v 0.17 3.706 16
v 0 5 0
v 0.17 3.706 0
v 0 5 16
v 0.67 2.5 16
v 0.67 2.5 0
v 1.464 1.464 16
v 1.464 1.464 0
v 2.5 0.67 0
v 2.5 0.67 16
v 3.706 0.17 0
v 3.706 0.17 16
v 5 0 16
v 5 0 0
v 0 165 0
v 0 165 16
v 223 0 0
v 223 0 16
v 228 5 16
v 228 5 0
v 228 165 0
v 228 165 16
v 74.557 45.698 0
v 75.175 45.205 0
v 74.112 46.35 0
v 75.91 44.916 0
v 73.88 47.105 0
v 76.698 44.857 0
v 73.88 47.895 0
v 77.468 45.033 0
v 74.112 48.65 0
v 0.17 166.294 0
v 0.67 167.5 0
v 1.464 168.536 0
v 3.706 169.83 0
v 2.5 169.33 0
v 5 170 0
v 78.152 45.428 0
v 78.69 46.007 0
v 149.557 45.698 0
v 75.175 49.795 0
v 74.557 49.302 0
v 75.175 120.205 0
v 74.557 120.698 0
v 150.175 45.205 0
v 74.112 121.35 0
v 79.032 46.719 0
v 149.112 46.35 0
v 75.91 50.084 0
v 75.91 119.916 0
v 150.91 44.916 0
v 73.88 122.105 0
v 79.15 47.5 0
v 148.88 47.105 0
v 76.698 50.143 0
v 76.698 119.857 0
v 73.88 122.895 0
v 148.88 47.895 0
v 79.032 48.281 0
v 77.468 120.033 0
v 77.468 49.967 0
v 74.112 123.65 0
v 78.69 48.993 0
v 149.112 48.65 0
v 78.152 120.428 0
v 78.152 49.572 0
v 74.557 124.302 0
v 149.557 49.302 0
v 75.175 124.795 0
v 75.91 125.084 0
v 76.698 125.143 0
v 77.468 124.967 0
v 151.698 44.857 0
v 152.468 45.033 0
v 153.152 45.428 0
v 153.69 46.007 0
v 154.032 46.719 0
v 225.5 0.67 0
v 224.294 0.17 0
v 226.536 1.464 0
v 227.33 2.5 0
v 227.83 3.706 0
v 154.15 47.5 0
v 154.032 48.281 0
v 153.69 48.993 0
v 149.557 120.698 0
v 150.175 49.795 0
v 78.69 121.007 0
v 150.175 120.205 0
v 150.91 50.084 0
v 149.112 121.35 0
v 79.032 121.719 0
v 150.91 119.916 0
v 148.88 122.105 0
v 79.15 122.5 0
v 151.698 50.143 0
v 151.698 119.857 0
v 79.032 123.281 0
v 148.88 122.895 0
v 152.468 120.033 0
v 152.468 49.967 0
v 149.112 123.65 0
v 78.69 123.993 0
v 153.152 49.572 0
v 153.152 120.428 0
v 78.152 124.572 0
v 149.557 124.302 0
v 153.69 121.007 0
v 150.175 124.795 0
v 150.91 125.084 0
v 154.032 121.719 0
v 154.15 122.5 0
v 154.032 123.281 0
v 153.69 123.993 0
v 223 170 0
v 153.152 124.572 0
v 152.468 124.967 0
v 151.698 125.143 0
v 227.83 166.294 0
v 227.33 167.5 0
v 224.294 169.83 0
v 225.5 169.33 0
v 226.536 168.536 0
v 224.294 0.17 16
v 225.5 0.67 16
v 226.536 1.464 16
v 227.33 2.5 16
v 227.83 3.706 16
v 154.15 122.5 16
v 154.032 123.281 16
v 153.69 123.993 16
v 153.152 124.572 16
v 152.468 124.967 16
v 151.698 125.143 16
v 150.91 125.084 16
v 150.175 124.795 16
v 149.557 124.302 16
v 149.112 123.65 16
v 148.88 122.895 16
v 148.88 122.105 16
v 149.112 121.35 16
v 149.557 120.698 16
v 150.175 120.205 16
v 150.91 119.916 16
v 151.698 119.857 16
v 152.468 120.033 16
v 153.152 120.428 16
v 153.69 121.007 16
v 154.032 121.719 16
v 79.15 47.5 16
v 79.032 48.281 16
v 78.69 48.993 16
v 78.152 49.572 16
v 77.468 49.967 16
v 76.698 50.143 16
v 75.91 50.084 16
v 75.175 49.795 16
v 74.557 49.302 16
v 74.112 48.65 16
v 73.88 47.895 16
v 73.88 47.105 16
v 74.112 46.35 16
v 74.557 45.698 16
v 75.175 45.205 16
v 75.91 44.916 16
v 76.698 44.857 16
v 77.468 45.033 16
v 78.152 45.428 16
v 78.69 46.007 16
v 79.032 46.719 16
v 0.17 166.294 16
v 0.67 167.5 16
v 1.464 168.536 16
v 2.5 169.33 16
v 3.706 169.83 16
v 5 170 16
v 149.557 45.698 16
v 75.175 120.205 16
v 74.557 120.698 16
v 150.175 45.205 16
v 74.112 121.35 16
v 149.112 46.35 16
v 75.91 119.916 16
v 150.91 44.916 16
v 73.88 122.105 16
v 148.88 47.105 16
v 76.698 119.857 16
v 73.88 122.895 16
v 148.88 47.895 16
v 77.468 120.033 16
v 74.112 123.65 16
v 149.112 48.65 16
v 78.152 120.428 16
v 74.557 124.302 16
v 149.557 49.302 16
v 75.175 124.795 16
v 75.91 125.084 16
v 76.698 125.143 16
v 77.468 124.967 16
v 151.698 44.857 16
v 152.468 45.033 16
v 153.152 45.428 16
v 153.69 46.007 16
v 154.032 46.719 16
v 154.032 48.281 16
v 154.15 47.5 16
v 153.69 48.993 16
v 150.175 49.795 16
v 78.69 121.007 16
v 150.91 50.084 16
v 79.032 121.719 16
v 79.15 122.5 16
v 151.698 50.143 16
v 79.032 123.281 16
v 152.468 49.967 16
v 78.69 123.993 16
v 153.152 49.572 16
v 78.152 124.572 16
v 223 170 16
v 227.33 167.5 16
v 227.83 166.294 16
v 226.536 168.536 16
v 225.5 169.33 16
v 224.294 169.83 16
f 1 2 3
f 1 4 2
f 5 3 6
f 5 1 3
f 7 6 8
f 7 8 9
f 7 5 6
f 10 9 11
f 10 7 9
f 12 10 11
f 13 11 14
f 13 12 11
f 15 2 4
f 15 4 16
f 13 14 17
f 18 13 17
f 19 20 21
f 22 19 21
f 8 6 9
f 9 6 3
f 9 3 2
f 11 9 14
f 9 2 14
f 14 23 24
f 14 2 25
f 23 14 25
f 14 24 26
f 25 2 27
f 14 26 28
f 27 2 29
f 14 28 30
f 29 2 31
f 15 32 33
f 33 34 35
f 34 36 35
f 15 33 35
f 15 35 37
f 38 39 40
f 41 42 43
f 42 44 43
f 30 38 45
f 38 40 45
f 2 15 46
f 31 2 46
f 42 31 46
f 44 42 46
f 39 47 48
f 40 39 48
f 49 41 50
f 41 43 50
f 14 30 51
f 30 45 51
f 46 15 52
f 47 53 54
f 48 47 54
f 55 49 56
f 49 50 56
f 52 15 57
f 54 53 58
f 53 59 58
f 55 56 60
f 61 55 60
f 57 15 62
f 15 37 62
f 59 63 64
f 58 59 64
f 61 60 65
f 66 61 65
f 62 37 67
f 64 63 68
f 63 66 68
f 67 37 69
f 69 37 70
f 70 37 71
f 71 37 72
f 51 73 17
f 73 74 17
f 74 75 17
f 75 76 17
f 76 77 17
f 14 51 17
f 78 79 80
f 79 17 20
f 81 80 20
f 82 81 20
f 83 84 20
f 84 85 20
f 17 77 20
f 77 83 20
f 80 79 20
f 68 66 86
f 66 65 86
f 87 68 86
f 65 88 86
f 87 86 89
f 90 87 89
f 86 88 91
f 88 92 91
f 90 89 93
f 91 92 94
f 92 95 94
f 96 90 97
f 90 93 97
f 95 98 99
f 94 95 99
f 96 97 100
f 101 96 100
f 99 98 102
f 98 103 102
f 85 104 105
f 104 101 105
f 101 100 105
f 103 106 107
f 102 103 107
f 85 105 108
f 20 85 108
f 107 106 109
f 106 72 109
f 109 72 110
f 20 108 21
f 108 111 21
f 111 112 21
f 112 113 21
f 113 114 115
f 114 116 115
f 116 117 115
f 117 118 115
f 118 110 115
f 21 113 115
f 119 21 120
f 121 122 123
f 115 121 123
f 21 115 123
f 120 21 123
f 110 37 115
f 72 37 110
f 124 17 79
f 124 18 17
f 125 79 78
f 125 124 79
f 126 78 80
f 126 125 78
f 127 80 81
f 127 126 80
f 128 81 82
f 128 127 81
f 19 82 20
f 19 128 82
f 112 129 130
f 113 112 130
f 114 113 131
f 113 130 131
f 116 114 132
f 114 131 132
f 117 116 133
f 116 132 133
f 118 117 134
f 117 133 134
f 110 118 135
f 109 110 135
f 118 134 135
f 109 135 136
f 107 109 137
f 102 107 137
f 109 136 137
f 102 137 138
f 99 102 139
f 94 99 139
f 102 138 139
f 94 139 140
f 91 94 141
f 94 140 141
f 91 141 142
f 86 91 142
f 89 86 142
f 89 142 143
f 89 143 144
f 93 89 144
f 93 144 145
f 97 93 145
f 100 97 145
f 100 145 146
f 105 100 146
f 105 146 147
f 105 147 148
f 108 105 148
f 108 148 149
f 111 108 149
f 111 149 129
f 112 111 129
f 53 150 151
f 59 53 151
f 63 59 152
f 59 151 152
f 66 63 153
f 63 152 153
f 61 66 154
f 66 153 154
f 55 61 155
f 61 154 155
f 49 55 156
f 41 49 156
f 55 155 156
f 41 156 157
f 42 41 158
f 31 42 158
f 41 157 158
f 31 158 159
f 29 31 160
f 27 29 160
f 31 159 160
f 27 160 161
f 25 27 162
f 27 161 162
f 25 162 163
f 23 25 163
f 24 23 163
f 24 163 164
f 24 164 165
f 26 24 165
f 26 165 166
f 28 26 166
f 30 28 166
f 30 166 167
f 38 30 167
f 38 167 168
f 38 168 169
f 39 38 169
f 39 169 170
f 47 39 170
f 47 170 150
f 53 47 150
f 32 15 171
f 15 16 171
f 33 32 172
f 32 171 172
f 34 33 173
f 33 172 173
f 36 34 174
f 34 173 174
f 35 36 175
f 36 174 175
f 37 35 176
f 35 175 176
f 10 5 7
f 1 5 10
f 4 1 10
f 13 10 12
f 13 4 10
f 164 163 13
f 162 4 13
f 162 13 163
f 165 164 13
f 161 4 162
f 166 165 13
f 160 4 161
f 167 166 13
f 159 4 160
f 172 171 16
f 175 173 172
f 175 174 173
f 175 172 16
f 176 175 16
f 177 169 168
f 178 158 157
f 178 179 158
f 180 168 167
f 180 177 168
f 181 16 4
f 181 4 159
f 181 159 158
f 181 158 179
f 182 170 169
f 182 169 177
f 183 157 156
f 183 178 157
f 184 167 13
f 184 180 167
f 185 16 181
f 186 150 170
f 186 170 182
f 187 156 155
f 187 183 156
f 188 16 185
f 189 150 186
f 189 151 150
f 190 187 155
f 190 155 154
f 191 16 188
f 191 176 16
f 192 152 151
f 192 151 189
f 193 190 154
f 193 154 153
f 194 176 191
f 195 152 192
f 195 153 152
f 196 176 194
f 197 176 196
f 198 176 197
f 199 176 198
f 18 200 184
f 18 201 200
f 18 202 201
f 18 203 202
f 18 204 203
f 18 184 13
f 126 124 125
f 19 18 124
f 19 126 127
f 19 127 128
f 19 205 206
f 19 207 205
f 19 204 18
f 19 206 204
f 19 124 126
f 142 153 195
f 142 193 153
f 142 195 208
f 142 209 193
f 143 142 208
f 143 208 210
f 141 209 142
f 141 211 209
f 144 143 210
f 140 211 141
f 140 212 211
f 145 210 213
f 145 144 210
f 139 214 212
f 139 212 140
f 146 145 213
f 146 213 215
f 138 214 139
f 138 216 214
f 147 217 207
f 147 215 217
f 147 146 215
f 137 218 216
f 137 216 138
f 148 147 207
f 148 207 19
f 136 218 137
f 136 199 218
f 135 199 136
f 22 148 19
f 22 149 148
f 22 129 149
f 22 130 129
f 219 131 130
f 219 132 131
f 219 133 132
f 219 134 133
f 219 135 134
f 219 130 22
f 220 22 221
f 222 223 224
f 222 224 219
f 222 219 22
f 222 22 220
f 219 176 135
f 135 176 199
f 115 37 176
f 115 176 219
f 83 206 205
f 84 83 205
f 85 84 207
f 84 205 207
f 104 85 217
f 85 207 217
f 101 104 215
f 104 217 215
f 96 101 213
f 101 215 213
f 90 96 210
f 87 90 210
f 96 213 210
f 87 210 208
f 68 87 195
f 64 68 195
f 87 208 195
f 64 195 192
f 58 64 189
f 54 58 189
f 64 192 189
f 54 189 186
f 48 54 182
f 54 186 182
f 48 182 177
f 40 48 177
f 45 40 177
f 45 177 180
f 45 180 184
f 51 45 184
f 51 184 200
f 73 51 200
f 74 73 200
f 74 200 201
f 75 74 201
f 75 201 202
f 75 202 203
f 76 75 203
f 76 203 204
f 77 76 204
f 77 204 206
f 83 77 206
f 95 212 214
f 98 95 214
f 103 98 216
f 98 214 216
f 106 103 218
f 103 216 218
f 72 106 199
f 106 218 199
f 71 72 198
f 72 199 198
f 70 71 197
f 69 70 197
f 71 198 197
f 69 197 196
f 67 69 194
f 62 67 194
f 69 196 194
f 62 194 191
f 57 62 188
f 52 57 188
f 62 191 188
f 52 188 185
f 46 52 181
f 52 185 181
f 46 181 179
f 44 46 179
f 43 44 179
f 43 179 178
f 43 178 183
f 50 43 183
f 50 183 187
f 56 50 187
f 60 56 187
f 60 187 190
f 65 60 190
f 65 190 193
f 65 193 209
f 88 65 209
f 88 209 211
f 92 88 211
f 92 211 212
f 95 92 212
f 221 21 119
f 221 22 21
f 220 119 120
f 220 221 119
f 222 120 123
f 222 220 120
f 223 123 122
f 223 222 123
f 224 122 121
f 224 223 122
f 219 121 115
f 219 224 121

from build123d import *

# Parameters (mm, degrees)
SKETCH1_W           = 228
SKETCH1_H           = 170
BOSS_EXTRUDE1_DEPTH = 16
FILLET1_R           = 5
CUT_EXTRUDE1_REACH  = 18
SKETCH2_R           = 2.65


with BuildPart() as part:
    # Sketch1 → Boss-Extrude1 (new body)
    with BuildSketch(Plane.XY):
        with Locations((114, 85)):
            Rectangle(SKETCH1_W, SKETCH1_H)
    extrude(amount=BOSS_EXTRUDE1_DEPTH)

    # Fillet1
    fillet1_edges = [part.edges().sort_by_distance(p)[0] for p in [
        (0, 170, 8),
        (228, 170, 8),
        (228, 0, 8),
        (0, 0, 8),
    ]]
    fillet(fillet1_edges, radius=FILLET1_R)

    # Sketch2 → Cut-Extrude1 (cut, up to next)
    with BuildSketch(Plane.XY.offset(16), mode=Mode.PRIVATE) as cut_extrude1_sk1:
        with Locations((76.5, 122.5)):
            Circle(SKETCH2_R)
    cut_extrude1_tool1 = extrude(cut_extrude1_sk1.sketch, amount=-CUT_EXTRUDE1_REACH, mode=Mode.PRIVATE) & part.part
    add(cut_extrude1_tool1.solids().sort_by_distance((76.5, 122.5, 16))[0], mode=Mode.SUBTRACT)
    # Sketch2 → Cut-Extrude1 (cut, up to next)
    with BuildSketch(Plane.XY.offset(16), mode=Mode.PRIVATE) as cut_extrude1_sk2:
        with Locations((151.5, 122.5)):
            Circle(SKETCH2_R)
    cut_extrude1_tool2 = extrude(cut_extrude1_sk2.sketch, amount=-CUT_EXTRUDE1_REACH, mode=Mode.PRIVATE) & part.part
    add(cut_extrude1_tool2.solids().sort_by_distance((151.5, 122.5, 16))[0], mode=Mode.SUBTRACT)
    # Sketch2 → Cut-Extrude1 (cut, up to next)
    with BuildSketch(Plane.XY.offset(16), mode=Mode.PRIVATE) as cut_extrude1_sk3:
        with Locations((76.5, 47.5)):
            Circle(SKETCH2_R)
    cut_extrude1_tool3 = extrude(cut_extrude1_sk3.sketch, amount=-CUT_EXTRUDE1_REACH, mode=Mode.PRIVATE) & part.part
    add(cut_extrude1_tool3.solids().sort_by_distance((76.5, 47.5, 16))[0], mode=Mode.SUBTRACT)
    # Sketch2 → Cut-Extrude1 (cut, up to next)
    with BuildSketch(Plane.XY.offset(16), mode=Mode.PRIVATE) as cut_extrude1_sk4:
        with Locations((151.5, 47.5)):
            Circle(SKETCH2_R)
    cut_extrude1_tool4 = extrude(cut_extrude1_sk4.sketch, amount=-CUT_EXTRUDE1_REACH, mode=Mode.PRIVATE) & part.part
    add(cut_extrude1_tool4.solids().sort_by_distance((151.5, 47.5, 16))[0], mode=Mode.SUBTRACT)


solid = part.part
